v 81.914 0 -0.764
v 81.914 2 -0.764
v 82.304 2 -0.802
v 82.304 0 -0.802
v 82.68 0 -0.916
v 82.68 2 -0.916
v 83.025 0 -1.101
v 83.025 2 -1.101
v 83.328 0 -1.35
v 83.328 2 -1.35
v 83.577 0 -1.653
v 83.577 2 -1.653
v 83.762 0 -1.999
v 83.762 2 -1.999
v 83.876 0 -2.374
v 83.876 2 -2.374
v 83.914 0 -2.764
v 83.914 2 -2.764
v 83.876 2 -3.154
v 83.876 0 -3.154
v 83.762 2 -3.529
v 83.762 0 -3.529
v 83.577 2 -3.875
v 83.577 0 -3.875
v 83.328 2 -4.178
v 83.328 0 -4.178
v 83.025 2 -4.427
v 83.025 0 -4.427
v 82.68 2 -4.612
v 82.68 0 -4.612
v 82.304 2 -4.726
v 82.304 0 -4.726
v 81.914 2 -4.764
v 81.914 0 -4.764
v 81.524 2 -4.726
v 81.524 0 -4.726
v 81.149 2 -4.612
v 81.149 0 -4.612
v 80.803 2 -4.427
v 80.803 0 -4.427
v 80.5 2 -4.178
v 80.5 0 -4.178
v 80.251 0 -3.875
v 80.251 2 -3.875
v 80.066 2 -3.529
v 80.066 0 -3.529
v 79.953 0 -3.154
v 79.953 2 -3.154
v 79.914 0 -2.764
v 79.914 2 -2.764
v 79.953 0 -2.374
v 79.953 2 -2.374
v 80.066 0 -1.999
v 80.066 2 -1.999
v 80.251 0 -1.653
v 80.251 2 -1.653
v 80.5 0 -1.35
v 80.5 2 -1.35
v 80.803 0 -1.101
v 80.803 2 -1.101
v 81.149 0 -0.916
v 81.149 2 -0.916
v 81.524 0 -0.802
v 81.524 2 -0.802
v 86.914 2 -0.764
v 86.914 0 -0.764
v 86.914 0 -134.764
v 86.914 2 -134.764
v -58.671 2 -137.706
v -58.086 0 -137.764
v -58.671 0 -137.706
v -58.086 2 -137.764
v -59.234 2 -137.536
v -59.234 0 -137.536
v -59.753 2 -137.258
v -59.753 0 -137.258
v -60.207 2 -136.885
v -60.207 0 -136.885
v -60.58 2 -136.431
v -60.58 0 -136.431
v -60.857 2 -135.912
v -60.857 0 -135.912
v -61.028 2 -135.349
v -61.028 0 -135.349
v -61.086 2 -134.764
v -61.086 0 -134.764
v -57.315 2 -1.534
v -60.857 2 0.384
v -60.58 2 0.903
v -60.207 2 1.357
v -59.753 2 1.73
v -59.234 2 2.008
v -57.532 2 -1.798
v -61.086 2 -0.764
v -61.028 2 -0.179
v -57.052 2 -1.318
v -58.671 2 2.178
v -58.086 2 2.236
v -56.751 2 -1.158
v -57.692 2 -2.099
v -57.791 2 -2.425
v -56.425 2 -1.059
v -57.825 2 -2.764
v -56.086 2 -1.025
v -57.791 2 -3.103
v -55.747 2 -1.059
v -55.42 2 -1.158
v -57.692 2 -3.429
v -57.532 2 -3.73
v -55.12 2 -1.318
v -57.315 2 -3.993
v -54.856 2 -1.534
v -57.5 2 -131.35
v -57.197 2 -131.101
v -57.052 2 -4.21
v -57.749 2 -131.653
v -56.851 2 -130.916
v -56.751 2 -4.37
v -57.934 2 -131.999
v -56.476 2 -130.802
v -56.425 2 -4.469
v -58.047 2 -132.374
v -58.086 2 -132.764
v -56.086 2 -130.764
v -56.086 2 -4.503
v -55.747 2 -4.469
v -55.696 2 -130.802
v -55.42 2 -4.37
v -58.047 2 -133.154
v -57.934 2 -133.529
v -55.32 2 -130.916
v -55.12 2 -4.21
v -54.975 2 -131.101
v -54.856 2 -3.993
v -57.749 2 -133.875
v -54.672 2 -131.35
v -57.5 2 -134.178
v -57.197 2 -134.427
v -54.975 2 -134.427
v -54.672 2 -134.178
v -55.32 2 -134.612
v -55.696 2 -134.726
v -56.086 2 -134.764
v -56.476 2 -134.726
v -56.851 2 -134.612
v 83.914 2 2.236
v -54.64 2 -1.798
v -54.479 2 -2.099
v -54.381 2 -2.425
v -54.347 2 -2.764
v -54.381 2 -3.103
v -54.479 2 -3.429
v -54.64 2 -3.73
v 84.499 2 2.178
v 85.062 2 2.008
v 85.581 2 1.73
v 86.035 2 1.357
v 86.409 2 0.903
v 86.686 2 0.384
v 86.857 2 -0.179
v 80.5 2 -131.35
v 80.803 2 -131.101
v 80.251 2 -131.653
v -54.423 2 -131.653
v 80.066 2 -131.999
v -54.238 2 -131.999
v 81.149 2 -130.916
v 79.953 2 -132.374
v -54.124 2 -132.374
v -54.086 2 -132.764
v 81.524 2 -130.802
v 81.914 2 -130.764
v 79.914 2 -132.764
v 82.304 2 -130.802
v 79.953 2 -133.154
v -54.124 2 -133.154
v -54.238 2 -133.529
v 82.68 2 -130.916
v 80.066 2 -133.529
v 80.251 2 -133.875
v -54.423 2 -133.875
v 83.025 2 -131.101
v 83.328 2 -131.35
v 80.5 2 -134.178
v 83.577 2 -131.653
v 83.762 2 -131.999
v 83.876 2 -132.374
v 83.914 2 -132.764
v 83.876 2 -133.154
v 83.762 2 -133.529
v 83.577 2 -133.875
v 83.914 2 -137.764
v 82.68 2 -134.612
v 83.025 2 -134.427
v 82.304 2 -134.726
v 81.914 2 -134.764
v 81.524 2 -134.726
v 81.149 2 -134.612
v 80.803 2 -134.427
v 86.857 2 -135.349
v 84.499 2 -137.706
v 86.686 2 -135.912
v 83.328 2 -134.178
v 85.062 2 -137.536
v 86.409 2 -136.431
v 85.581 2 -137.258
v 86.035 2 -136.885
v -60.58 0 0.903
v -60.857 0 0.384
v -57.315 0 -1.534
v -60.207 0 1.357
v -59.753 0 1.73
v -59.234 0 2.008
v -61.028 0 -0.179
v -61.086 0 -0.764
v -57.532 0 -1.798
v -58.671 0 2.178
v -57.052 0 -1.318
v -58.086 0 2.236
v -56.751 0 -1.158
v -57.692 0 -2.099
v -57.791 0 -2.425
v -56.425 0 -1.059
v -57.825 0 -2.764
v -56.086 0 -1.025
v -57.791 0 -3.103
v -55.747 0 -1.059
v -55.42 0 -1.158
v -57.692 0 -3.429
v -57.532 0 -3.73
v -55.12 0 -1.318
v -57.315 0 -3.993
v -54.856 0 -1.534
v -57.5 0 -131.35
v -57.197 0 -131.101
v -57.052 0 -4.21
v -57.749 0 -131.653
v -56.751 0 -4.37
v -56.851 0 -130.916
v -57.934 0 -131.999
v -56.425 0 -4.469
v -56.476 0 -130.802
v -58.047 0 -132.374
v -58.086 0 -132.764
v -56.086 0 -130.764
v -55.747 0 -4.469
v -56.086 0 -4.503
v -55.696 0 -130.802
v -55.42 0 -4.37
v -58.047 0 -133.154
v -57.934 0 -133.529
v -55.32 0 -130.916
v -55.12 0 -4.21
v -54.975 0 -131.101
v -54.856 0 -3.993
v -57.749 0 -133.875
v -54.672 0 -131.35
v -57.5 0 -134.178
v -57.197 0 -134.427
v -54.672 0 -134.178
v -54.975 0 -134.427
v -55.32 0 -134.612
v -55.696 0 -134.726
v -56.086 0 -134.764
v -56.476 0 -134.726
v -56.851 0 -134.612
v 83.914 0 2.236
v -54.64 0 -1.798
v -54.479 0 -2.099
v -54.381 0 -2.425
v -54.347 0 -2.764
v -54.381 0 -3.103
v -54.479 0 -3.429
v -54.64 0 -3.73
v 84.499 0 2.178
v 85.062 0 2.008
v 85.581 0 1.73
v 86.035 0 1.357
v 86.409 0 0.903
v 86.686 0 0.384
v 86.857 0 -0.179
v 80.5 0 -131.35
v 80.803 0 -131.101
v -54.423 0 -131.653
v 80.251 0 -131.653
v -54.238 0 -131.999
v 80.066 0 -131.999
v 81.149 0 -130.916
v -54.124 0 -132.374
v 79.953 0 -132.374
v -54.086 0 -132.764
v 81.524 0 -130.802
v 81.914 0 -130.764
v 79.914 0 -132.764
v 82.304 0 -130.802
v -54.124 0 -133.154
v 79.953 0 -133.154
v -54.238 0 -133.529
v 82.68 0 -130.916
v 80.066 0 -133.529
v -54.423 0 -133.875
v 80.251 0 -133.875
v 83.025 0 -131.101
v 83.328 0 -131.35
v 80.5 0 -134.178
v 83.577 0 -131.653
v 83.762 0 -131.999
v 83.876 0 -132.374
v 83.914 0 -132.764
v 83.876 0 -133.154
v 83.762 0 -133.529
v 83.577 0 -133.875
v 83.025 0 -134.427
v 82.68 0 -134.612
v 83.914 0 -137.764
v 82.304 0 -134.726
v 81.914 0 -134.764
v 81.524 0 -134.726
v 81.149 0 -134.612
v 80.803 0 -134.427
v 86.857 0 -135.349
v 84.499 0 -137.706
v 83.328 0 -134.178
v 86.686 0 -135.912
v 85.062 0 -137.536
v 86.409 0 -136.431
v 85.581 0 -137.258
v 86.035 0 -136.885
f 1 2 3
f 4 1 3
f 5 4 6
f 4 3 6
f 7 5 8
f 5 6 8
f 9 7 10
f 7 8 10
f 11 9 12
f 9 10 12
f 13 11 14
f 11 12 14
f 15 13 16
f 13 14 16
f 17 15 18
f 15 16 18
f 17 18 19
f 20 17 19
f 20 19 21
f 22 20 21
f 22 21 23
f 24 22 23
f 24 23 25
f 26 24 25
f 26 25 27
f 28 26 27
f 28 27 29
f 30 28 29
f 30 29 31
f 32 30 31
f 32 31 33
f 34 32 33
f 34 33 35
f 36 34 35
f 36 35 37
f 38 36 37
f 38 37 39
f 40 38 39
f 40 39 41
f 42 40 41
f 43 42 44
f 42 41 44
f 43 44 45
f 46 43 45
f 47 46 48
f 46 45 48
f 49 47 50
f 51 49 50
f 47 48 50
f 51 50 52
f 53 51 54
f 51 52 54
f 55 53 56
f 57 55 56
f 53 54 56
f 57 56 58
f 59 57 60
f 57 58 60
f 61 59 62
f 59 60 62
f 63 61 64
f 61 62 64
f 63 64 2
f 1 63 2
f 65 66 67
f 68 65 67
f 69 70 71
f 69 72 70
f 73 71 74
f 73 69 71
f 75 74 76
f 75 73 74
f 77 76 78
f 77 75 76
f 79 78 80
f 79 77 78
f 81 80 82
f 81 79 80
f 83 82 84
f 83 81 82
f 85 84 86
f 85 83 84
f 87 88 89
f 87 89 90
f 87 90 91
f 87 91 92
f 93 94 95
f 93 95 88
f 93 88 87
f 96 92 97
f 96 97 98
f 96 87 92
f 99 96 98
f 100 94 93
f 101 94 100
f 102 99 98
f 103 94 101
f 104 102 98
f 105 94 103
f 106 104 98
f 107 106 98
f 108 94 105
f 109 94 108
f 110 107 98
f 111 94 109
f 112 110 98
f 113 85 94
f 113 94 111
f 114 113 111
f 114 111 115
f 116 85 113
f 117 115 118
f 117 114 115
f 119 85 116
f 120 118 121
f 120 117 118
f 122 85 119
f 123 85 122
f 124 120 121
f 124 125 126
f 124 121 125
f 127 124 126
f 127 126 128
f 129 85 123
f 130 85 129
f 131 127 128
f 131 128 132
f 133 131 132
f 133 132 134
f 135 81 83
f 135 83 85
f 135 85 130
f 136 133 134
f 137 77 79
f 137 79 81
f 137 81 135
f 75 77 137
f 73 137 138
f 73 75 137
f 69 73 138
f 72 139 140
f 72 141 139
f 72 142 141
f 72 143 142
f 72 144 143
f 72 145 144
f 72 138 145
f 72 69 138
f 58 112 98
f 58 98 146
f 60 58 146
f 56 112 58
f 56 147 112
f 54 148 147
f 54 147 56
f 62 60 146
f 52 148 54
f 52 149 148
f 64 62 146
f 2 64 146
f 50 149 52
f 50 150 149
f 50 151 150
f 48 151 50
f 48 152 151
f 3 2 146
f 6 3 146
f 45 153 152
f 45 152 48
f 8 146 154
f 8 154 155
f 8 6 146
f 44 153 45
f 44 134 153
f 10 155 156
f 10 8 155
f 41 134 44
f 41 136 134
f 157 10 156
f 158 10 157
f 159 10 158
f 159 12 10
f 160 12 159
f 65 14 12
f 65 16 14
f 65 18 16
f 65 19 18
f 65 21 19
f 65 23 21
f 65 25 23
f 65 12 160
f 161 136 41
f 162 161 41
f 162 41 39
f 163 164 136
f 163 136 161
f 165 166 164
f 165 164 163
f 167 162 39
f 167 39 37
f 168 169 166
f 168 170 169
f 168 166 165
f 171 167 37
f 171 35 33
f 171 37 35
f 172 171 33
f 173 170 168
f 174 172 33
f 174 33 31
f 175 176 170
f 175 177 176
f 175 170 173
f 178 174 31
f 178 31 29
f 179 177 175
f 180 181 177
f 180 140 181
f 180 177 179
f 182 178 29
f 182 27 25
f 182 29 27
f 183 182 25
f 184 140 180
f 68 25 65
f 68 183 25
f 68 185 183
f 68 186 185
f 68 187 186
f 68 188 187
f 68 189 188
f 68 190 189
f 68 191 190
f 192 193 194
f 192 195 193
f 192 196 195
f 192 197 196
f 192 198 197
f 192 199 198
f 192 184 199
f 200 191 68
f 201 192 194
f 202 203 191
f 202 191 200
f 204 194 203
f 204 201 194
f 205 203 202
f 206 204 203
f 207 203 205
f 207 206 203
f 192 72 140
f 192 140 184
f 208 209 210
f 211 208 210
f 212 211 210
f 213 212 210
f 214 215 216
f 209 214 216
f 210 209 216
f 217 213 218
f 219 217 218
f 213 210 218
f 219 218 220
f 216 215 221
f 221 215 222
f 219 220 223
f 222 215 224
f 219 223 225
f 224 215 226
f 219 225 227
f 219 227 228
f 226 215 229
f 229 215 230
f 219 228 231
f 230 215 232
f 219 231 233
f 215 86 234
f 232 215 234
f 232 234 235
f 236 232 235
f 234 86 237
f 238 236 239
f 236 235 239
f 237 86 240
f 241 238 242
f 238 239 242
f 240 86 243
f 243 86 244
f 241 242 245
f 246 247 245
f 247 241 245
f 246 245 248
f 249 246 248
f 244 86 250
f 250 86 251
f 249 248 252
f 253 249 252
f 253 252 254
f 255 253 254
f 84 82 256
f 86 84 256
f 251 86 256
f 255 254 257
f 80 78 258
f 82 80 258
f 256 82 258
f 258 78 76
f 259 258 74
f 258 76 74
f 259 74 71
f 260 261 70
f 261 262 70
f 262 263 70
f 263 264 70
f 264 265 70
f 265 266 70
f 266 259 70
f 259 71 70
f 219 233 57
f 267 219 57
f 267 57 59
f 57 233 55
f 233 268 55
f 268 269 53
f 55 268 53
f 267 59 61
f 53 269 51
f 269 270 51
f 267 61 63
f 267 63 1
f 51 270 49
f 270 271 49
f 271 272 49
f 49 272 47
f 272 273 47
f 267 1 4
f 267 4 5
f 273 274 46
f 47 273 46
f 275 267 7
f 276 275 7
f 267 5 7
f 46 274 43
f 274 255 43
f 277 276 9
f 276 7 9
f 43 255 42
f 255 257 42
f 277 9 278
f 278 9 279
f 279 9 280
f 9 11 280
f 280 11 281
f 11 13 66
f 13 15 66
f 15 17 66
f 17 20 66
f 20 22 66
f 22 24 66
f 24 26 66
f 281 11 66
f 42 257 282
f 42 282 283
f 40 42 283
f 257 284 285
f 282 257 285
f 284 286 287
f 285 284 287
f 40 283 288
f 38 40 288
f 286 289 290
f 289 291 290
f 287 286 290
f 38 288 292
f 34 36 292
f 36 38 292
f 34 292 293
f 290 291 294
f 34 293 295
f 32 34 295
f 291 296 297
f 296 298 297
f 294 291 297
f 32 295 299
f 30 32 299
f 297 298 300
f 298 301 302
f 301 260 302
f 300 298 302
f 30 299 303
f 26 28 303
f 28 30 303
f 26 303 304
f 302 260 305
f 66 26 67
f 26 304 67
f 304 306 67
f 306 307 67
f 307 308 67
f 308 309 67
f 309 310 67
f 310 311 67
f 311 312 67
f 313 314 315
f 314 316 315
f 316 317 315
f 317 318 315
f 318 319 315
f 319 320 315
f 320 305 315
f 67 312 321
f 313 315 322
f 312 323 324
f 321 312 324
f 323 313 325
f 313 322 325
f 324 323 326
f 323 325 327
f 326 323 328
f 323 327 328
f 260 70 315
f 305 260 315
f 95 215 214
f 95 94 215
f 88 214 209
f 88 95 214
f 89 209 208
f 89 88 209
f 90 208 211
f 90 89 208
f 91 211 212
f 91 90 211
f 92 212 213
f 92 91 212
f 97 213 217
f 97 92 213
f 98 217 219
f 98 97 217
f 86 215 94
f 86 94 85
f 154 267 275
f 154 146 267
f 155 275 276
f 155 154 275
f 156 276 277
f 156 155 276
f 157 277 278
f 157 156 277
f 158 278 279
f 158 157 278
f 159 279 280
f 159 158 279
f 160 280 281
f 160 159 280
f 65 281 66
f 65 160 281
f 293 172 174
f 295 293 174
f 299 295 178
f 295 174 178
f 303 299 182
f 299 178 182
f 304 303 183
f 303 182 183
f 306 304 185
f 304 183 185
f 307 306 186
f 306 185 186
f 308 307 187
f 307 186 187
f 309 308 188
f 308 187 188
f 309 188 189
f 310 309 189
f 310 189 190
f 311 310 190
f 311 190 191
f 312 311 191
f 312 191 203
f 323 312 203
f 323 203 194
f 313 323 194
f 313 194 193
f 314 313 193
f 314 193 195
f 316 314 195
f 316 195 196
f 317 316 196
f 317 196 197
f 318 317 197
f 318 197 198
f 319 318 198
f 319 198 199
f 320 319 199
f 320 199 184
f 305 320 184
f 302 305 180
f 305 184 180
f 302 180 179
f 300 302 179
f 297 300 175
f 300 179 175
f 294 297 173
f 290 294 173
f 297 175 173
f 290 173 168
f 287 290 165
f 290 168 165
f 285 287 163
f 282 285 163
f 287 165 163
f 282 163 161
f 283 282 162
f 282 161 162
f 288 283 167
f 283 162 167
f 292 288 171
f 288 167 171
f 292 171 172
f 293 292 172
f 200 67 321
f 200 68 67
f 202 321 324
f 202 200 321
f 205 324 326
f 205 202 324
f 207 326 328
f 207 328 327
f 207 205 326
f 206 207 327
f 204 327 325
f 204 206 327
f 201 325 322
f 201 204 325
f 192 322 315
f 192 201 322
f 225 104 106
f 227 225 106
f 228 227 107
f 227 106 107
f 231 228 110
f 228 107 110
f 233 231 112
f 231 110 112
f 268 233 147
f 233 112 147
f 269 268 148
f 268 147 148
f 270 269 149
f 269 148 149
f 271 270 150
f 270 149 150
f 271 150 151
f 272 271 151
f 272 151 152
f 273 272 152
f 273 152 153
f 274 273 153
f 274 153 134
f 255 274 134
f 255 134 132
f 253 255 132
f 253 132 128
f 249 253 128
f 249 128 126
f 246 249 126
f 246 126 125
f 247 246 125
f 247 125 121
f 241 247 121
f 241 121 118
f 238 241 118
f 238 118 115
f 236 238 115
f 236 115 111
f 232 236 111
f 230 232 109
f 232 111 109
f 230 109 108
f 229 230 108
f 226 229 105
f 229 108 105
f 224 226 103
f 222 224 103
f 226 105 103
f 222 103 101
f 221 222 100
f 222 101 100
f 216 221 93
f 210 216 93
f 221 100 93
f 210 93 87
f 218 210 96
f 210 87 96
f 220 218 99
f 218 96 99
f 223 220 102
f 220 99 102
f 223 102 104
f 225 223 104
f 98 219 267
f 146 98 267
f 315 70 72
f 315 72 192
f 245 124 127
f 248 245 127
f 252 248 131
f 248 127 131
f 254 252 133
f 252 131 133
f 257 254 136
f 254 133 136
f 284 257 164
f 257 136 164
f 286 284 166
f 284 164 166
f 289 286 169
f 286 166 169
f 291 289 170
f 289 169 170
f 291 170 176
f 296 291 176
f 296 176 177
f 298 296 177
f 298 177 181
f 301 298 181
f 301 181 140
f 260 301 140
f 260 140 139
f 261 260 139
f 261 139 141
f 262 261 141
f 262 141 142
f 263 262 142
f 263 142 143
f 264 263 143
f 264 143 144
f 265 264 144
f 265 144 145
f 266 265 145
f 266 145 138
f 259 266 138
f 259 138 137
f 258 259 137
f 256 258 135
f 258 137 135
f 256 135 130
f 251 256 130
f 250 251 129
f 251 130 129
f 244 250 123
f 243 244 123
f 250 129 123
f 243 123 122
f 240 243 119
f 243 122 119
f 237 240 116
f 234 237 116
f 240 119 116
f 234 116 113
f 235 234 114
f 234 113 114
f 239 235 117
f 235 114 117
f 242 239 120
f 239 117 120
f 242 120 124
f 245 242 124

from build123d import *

# Parameters (mm, degrees)
SKETCH1_W           = 148
SKETCH1_H           = 140
BOSS_EXTRUDE1_DEPTH = 2
SKETCH2_R           = 2
SKETCH2_R_2         = 1.73874997
CUT_EXTRUDE1_DEPTH  = 5
FILLET1_R           = 3
FILLET2_R           = 3
FILLET3_R           = 3
FILLET4_R           = 3


with BuildPart() as part:
    # Sketch1 → Boss-Extrude1 (new body)
    with BuildSketch(Plane(origin=(0, 0, 0), x_dir=(1, 0, 0), z_dir=(0, 1, 0))):
        with Locations((12.91414701, 67.76397383)):
            Rectangle(SKETCH1_W, SKETCH1_H)
    extrude(amount=BOSS_EXTRUDE1_DEPTH)

    # Sketch2 → Cut-Extrude1 (cut)
    with BuildSketch(Plane(origin=(0, 2, 0), x_dir=(1, 0, 0), z_dir=(0, 1, 0))):
        with Locations(Location((-56.08585299, 132.76397383, 0), (0, 0, 270))):
            Circle(SKETCH2_R)
        with Locations(Location((81.91414701, 132.76397383, 0), (0, 0, 270))):
            Circle(SKETCH2_R)
        with Locations(Location((81.91414701, 2.76397383, 0), (0, 0, 270))):
            Circle(SKETCH2_R)
        with Locations(Location((-56.08585299, 2.76397383, 0), (0, 0, 270))):
            Circle(SKETCH2_R_2)
    extrude(amount=-CUT_EXTRUDE1_DEPTH, mode=Mode.SUBTRACT)

    # Fillet1
    fillet1_edges = [part.edges().sort_by_distance(p)[0] for p in [
        (86.91414701, 1, 2.23602617),
    ]]
    fillet(fillet1_edges, radius=FILLET1_R)

    # Fillet2
    fillet2_edges = [part.edges().sort_by_distance(p)[0] for p in [
        (86.91414701, 1, -137.76397383),
    ]]
    fillet(fillet2_edges, radius=FILLET2_R)

    # Fillet3
    fillet3_edges = [part.edges().sort_by_distance(p)[0] for p in [
        (-61.08585299, 1, -137.76397383),
    ]]
    fillet(fillet3_edges, radius=FILLET3_R)

    # Fillet4
    fillet4_edges = [part.edges().sort_by_distance(p)[0] for p in [
        (-61.08585299, 1, 2.23602617),
    ]]
    fillet(fillet4_edges, radius=FILLET4_R)


solid = part.part
